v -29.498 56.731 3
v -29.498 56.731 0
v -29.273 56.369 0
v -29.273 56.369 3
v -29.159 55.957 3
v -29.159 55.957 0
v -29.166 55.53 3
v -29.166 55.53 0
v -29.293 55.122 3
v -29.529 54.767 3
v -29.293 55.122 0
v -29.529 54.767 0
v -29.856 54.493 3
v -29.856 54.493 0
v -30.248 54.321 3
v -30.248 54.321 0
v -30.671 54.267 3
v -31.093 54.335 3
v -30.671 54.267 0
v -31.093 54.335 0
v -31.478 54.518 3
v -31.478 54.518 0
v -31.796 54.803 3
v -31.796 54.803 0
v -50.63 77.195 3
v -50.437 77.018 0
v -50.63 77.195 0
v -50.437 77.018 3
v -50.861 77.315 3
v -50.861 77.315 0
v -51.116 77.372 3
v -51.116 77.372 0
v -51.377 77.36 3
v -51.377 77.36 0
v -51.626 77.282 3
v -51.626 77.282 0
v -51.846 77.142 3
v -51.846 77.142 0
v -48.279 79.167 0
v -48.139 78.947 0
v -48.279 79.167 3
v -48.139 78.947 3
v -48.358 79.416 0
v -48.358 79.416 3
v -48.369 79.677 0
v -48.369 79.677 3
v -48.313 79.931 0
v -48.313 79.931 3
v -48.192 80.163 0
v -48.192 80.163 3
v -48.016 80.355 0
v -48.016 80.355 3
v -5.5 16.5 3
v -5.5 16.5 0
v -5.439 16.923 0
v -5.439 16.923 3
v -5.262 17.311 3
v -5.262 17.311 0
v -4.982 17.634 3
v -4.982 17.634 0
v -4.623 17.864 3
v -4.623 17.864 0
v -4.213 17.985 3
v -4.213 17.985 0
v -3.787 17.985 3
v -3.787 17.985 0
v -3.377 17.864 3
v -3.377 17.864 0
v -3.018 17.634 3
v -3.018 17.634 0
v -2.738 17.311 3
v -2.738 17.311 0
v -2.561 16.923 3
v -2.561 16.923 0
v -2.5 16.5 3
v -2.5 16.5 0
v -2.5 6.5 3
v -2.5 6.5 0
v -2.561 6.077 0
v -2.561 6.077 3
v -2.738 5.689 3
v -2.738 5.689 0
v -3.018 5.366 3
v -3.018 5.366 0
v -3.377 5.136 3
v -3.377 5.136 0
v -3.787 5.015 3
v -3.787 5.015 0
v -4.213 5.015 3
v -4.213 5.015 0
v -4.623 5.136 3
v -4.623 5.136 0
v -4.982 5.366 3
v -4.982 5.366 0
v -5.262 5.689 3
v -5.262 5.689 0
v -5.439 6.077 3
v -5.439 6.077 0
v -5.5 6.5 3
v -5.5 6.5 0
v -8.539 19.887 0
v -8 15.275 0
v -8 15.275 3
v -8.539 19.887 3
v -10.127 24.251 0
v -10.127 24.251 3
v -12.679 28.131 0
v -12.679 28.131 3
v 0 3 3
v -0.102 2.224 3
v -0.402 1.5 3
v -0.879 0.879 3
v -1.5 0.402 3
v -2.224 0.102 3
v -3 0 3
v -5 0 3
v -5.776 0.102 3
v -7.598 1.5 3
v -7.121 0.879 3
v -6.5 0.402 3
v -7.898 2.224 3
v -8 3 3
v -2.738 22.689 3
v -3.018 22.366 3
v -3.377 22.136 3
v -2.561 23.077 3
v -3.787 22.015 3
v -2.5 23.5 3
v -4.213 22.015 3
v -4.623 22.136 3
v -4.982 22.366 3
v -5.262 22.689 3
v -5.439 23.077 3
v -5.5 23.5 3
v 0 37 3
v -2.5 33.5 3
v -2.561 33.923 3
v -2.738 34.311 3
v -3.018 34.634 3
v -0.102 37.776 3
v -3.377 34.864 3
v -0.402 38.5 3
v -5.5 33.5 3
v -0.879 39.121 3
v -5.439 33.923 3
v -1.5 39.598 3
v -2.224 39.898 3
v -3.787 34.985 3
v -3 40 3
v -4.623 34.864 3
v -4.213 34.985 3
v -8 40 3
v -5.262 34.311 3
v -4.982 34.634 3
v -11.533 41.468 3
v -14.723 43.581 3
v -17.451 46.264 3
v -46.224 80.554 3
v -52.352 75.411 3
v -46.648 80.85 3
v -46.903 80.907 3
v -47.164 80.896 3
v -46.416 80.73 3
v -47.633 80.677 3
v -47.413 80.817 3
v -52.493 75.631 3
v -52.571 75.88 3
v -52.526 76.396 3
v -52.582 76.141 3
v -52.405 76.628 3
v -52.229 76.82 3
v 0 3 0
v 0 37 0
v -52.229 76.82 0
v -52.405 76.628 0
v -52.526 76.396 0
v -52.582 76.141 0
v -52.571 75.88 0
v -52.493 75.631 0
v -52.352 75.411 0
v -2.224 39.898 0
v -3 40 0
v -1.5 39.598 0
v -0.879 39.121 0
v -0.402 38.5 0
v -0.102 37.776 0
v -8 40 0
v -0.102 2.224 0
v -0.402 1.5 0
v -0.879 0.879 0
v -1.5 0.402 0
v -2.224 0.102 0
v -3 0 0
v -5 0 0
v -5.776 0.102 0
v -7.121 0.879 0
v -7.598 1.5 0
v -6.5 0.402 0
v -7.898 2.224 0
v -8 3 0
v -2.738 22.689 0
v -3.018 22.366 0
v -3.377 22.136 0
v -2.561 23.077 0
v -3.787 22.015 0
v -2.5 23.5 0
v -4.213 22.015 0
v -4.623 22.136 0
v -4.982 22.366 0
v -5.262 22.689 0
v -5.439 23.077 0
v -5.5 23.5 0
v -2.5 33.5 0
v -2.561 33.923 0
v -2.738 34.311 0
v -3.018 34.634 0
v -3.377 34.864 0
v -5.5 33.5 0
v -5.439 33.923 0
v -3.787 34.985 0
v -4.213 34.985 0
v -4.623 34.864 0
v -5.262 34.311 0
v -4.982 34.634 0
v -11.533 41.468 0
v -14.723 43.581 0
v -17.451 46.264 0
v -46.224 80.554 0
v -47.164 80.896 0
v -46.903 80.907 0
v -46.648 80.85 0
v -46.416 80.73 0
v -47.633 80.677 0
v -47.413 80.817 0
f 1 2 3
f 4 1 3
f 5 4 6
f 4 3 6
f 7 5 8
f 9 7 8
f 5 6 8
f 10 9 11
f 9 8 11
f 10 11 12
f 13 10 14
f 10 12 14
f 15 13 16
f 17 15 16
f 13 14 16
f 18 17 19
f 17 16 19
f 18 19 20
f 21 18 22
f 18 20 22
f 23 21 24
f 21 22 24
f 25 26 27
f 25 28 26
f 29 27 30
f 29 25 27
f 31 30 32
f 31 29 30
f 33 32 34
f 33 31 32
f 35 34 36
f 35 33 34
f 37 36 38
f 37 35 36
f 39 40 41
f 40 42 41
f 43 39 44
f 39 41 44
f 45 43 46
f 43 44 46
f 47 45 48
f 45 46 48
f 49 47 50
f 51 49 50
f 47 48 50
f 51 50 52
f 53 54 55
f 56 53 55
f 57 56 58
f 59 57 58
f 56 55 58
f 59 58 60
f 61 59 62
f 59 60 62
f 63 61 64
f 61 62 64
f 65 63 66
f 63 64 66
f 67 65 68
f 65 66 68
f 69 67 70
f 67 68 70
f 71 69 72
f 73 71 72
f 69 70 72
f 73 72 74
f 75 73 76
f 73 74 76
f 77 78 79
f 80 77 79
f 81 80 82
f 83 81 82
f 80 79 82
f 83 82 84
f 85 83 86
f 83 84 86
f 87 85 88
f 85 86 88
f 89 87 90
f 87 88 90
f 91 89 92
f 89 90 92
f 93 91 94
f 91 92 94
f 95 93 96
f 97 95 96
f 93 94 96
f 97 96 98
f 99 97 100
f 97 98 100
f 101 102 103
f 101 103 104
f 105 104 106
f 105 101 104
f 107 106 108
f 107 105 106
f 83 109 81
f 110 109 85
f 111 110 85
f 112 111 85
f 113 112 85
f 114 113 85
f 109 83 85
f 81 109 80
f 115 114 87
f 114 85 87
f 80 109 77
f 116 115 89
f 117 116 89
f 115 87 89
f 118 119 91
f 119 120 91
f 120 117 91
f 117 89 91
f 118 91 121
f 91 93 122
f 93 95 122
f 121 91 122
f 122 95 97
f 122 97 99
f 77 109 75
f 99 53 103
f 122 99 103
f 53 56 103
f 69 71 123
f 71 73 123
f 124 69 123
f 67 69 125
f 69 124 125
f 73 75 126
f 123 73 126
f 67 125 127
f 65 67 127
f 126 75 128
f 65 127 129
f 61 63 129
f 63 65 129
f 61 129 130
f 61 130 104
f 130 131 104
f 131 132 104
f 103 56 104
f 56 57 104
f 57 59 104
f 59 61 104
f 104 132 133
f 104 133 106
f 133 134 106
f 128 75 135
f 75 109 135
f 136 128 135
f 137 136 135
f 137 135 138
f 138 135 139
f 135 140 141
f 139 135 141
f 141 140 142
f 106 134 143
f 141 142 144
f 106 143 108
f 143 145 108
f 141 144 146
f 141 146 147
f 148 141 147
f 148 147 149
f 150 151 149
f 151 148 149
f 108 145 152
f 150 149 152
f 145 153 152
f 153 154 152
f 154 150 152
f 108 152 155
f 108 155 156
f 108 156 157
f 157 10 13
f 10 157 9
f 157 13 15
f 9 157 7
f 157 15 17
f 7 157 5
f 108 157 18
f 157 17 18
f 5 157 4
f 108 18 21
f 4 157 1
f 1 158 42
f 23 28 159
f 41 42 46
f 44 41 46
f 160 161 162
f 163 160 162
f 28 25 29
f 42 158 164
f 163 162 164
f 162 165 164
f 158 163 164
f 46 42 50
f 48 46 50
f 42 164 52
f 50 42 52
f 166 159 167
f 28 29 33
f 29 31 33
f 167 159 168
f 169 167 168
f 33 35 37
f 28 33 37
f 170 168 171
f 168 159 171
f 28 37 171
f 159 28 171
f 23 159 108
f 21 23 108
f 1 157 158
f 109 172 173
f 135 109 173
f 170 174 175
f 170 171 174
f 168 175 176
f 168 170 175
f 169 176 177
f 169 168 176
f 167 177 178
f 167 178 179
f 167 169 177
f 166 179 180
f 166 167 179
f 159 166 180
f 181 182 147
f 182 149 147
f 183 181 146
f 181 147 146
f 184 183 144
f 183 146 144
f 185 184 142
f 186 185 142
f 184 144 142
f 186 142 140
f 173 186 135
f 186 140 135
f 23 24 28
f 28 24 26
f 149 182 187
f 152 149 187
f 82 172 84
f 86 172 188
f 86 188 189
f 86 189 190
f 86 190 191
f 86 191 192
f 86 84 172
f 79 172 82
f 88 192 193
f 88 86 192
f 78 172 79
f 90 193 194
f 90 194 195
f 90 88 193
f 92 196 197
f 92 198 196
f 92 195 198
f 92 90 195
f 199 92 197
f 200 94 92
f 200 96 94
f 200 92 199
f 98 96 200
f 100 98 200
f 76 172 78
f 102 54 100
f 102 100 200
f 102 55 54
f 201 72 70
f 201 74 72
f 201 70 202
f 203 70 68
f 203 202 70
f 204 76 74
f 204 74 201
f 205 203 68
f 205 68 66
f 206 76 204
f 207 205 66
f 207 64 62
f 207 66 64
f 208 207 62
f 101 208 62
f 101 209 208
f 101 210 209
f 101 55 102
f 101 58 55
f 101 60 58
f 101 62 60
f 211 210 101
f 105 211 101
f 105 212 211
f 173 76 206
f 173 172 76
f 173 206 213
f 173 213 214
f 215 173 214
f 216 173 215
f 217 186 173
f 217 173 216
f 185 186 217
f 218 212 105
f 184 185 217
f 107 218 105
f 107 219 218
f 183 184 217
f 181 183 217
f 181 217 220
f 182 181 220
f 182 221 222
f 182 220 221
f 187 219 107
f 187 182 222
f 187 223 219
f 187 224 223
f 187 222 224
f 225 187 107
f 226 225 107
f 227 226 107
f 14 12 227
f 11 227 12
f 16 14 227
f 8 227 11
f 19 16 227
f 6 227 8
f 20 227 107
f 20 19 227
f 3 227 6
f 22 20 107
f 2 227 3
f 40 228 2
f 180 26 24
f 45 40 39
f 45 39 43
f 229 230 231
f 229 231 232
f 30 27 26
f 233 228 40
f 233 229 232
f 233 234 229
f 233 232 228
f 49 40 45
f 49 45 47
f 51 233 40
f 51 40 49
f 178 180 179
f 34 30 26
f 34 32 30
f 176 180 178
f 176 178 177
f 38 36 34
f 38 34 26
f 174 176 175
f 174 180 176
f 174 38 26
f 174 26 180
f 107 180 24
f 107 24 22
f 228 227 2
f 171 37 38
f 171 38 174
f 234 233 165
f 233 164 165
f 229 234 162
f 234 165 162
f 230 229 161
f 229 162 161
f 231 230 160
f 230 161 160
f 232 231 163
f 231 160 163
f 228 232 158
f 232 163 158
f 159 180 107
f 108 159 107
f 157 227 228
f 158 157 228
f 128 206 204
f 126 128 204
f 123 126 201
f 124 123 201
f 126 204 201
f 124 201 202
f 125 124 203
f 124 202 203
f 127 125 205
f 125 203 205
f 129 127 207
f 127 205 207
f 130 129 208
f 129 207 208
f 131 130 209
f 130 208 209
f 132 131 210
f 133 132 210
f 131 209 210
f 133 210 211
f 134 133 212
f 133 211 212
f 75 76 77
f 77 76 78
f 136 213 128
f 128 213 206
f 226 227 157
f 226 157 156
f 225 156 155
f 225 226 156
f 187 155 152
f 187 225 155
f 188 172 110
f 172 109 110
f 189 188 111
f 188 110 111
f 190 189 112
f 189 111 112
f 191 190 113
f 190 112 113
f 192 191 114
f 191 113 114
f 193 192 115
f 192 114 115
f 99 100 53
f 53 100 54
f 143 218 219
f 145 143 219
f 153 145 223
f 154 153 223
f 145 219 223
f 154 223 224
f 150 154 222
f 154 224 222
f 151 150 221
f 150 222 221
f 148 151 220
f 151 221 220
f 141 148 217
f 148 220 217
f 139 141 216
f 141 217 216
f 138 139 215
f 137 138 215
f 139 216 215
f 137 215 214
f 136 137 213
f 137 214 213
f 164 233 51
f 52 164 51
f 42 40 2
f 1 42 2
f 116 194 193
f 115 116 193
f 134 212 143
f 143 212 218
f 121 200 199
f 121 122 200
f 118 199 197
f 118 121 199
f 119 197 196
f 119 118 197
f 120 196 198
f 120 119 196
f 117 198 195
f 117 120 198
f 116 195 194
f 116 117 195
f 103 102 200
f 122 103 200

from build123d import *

# Parameters (mm, degrees)
F1_DEPTH    = 3
F2_R        = 1
F3_T1_DEPTH = 3
F4_R        = 3


# Not quite as in the source:
# - a fillet or chamfer that OpenCascade refuses, or shapes differently, is made with other operations: its cross-section is extruded or revolved along the edge and cut away or added


with BuildPart() as f1:
    # F0 (on Top) → F1 (new body)
    with BuildSketch(Plane.XY):
        with BuildLine():
            ThreePointArc((-29.4982599503, 56.7313189632), (-29.6831452005, 54.6180708839), (-31.7963932797, 54.8029561341))
            Line((-31.7963932797, 54.8029561341), (-51.0800215703, 77.7842894277))
            Line((-51.0800215703, 77.7842894277), (-52.9951326781, 76.1773204034))
            Line((-52.9951326781, 76.1773204034), (-8, 22.5542093851))
            Line((-8, 22.5542093851), (-8, 0))
            Line((-8, 0), (0, 0))
            Line((0, 0), (0, 40))
            Line((0, 40), (-8, 40))
            Line((-8, 40), (-8, 35))
            Line((-8, 35), (-46.8667771331, 81.3196212809))
            Line((-46.8667771331, 81.3196212809), (-48.7818882409, 79.7126522567))
            Line((-48.7818882409, 79.7126522567), (-29.4982599503, 56.7313189632))
        make_face()
        with BuildLine():
            Line((-2.5, 16.5), (-2.5, 6.5))
            ThreePointArc((-2.5, 6.5), (-4, 5), (-5.5, 6.5))
            Line((-5.5, 6.5), (-5.5, 16.5))
            ThreePointArc((-5.5, 16.5), (-4, 18), (-2.5, 16.5))
        make_face(mode=Mode.SUBTRACT)
        with BuildLine():
            Line((-2.5, 33.5), (-2.5, 23.5))
            ThreePointArc((-2.5, 23.5), (-4, 22), (-5.5, 23.5))
            Line((-5.5, 23.5), (-5.5, 33.5))
            ThreePointArc((-5.5, 33.5), (-4, 35), (-2.5, 33.5))
        make_face(mode=Mode.SUBTRACT)
    extrude(amount=F1_DEPTH)

    # F2
    f2_edges = [f1.edges().sort_by_distance(p)[0] for p in [
        (-52.995133, 76.17732, 1.5),
        (-51.080022, 77.784289, 1.5),
        (-48.781888, 79.712652, 1.5),
        (-46.866777, 81.319621, 1.5),
    ]]
    fillet(f2_edges, radius=F2_R)

    # F3: fillet of radius 20 on 2 edges, made by hand

    # F3_s2 → F3_t1 (join)
    with BuildSketch(Plane.XY):
        with BuildLine():
            ThreePointArc((-17.4512262706, 46.2635328624), (-13.1787684603, 42.4479872276), (-8, 40))
            Line((-8, 40), (-8, 35))
            Line((-8, 35), (-17.4512262706, 46.2635328624))
        make_face()
        with BuildLine():
            ThreePointArc((-8, 15.2748046998), (-9.2061475843, 22.1152075663), (-12.6791111376, 28.1305568935))
            Line((-12.6791111376, 28.1305568935), (-8, 22.5542093851))
            Line((-8, 22.5542093851), (-8, 15.2748046998))
        make_face()
    extrude(amount=F3_T1_DEPTH)

    # F4
    f4_edges = [f1.edges().sort_by_distance(p)[0] for p in [
        (0, 40, 1.5),
        (-8, 0, 1.5),
        (0, 0, 1.5),
    ]]
    fillet(f4_edges, radius=F4_R)


solid = f1.part
